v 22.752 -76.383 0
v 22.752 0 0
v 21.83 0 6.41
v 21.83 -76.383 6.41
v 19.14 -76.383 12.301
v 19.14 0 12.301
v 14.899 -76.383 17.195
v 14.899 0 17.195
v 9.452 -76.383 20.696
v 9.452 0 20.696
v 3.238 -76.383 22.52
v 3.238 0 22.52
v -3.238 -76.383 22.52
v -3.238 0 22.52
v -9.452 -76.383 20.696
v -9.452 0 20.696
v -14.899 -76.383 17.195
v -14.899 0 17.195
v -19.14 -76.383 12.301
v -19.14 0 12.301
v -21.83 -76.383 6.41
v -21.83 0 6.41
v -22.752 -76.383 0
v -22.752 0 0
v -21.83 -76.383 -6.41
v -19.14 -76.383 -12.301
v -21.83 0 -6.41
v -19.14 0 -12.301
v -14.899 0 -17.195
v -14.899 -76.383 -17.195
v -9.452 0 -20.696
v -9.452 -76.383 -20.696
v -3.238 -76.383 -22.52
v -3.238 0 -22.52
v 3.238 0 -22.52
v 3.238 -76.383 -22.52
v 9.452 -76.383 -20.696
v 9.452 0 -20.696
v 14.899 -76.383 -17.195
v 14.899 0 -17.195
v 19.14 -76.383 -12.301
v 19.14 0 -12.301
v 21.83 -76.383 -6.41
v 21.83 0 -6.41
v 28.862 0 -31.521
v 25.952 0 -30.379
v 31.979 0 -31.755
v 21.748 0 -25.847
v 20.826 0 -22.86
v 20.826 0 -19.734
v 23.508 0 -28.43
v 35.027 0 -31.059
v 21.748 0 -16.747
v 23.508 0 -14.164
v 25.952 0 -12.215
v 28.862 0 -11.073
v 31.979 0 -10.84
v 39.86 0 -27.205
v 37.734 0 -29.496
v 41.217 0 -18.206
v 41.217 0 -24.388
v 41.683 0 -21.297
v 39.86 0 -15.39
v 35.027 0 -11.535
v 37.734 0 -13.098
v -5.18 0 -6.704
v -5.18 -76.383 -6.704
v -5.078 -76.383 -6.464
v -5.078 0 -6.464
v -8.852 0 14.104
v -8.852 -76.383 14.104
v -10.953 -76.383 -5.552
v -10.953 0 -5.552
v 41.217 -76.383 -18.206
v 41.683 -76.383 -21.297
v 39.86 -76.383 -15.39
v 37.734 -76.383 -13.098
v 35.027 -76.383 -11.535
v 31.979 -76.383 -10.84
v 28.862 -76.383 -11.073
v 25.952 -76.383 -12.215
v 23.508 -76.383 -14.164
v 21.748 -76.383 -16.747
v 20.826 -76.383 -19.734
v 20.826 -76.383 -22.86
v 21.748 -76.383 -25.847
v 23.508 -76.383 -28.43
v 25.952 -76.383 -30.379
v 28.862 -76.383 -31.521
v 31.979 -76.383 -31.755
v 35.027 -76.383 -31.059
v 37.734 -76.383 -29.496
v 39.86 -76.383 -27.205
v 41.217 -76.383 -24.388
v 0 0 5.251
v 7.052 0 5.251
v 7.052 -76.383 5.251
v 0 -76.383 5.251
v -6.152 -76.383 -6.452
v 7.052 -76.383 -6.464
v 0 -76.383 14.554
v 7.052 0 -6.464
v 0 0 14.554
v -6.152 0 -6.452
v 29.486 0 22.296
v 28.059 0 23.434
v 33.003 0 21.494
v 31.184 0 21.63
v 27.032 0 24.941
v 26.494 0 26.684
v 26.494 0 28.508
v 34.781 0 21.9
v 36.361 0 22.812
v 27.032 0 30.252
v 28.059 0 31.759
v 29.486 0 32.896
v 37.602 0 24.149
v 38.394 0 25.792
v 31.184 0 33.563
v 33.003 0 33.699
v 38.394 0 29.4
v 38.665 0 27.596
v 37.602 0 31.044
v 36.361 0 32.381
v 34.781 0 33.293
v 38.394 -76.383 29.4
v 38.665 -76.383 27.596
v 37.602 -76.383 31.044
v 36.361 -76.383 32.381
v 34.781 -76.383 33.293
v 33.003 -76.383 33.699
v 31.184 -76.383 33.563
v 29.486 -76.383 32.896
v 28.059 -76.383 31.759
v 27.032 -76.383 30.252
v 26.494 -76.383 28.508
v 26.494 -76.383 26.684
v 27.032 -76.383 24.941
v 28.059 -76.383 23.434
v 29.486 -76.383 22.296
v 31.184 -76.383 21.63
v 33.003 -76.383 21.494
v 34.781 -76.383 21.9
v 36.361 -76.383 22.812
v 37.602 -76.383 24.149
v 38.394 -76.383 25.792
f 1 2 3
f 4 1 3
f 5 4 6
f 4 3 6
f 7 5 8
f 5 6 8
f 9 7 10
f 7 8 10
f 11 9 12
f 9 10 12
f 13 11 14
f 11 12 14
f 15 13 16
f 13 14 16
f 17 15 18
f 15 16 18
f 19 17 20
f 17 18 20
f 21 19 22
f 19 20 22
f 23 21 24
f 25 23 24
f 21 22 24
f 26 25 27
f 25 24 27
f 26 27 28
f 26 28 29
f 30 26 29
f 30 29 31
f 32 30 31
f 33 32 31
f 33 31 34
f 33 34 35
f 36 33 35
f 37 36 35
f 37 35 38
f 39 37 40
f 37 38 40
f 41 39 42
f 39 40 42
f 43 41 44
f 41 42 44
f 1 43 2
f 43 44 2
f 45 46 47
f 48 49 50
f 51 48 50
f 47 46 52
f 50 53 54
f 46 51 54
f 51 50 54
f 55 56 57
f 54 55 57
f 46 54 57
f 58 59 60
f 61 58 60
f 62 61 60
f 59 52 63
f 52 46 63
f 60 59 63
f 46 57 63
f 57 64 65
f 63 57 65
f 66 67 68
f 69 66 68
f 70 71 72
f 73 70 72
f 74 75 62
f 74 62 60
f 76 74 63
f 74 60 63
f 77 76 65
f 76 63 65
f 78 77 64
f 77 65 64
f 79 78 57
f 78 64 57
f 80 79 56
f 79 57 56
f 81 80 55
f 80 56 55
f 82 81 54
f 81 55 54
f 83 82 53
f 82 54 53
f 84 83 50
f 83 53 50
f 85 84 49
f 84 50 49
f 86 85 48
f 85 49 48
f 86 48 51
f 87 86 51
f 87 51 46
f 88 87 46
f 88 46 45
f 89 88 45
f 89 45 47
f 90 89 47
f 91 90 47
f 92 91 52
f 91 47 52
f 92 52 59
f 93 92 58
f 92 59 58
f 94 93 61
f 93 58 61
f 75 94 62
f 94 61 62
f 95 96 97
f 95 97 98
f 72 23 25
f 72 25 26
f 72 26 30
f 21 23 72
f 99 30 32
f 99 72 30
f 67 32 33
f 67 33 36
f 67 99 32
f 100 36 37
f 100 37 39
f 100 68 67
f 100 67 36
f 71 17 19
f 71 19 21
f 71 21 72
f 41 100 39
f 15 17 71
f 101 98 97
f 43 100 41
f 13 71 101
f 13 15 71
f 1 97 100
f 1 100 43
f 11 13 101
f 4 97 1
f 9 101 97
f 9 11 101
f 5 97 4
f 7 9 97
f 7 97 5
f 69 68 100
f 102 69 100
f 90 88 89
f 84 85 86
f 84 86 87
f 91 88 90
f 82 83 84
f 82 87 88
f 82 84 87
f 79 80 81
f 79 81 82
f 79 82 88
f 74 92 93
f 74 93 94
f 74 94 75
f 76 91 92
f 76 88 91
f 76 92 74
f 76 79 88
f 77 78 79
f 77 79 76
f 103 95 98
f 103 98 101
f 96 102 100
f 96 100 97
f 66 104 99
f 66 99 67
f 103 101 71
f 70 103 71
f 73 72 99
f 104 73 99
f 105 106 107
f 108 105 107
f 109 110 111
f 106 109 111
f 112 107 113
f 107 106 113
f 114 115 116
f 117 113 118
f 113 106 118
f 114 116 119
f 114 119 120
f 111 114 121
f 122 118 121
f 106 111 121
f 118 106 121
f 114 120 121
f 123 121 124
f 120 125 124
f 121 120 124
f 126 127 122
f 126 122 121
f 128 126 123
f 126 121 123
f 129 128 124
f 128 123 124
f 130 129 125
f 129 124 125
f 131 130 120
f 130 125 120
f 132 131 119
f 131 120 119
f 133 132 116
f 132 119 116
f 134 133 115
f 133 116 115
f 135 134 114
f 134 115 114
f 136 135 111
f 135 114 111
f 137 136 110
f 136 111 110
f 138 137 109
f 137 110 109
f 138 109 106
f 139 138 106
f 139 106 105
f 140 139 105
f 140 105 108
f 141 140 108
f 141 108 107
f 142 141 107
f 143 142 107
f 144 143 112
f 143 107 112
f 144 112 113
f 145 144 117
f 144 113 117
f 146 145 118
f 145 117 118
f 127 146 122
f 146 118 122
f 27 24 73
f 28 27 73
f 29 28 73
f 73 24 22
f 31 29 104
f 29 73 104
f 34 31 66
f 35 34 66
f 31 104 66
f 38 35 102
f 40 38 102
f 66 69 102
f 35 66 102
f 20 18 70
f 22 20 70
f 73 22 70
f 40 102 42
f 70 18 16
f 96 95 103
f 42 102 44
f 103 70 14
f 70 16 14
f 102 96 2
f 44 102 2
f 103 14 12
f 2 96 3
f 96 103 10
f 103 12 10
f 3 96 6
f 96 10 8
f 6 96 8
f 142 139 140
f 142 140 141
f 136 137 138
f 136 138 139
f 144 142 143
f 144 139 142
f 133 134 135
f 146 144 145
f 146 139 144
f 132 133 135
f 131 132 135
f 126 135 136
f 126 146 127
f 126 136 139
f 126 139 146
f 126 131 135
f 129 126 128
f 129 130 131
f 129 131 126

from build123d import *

# Parameters (mm, degrees)
F0_R     = 6.119839
F0_R_2   = 22.751995
F0_R_3   = 10.486808
F1_DEPTH = 76.3833
F3_DEPTH = 76.3843


with BuildPart() as f1:
    # F0 (on Front) → F1 (new body)
    with BuildSketch(Plane.XZ):
        with Locations((32.545641, 27.596302)):
            Circle(F0_R)
        Circle(F0_R_2)
        with Locations((31.195819, -21.297127)):
            Circle(F0_R_3)
    extrude(amount=F1_DEPTH)

    # F2 (on face) → F3 (cut, through all)
    with BuildSketch(Plane.XZ.offset(76.3833)):
        Polygon((-5.179621, -6.7035), (-5.078201, -6.464352), (7.0519, -6.464352), (7.0519, 5.251378), (0, 5.251378), (0, 14.55386), (-8.852348, 14.10374), (-10.952905, -5.551502), (-6.151631, -6.451741), align=None)
    extrude(amount=-F3_DEPTH, mode=Mode.SUBTRACT)


solid = f1.part
